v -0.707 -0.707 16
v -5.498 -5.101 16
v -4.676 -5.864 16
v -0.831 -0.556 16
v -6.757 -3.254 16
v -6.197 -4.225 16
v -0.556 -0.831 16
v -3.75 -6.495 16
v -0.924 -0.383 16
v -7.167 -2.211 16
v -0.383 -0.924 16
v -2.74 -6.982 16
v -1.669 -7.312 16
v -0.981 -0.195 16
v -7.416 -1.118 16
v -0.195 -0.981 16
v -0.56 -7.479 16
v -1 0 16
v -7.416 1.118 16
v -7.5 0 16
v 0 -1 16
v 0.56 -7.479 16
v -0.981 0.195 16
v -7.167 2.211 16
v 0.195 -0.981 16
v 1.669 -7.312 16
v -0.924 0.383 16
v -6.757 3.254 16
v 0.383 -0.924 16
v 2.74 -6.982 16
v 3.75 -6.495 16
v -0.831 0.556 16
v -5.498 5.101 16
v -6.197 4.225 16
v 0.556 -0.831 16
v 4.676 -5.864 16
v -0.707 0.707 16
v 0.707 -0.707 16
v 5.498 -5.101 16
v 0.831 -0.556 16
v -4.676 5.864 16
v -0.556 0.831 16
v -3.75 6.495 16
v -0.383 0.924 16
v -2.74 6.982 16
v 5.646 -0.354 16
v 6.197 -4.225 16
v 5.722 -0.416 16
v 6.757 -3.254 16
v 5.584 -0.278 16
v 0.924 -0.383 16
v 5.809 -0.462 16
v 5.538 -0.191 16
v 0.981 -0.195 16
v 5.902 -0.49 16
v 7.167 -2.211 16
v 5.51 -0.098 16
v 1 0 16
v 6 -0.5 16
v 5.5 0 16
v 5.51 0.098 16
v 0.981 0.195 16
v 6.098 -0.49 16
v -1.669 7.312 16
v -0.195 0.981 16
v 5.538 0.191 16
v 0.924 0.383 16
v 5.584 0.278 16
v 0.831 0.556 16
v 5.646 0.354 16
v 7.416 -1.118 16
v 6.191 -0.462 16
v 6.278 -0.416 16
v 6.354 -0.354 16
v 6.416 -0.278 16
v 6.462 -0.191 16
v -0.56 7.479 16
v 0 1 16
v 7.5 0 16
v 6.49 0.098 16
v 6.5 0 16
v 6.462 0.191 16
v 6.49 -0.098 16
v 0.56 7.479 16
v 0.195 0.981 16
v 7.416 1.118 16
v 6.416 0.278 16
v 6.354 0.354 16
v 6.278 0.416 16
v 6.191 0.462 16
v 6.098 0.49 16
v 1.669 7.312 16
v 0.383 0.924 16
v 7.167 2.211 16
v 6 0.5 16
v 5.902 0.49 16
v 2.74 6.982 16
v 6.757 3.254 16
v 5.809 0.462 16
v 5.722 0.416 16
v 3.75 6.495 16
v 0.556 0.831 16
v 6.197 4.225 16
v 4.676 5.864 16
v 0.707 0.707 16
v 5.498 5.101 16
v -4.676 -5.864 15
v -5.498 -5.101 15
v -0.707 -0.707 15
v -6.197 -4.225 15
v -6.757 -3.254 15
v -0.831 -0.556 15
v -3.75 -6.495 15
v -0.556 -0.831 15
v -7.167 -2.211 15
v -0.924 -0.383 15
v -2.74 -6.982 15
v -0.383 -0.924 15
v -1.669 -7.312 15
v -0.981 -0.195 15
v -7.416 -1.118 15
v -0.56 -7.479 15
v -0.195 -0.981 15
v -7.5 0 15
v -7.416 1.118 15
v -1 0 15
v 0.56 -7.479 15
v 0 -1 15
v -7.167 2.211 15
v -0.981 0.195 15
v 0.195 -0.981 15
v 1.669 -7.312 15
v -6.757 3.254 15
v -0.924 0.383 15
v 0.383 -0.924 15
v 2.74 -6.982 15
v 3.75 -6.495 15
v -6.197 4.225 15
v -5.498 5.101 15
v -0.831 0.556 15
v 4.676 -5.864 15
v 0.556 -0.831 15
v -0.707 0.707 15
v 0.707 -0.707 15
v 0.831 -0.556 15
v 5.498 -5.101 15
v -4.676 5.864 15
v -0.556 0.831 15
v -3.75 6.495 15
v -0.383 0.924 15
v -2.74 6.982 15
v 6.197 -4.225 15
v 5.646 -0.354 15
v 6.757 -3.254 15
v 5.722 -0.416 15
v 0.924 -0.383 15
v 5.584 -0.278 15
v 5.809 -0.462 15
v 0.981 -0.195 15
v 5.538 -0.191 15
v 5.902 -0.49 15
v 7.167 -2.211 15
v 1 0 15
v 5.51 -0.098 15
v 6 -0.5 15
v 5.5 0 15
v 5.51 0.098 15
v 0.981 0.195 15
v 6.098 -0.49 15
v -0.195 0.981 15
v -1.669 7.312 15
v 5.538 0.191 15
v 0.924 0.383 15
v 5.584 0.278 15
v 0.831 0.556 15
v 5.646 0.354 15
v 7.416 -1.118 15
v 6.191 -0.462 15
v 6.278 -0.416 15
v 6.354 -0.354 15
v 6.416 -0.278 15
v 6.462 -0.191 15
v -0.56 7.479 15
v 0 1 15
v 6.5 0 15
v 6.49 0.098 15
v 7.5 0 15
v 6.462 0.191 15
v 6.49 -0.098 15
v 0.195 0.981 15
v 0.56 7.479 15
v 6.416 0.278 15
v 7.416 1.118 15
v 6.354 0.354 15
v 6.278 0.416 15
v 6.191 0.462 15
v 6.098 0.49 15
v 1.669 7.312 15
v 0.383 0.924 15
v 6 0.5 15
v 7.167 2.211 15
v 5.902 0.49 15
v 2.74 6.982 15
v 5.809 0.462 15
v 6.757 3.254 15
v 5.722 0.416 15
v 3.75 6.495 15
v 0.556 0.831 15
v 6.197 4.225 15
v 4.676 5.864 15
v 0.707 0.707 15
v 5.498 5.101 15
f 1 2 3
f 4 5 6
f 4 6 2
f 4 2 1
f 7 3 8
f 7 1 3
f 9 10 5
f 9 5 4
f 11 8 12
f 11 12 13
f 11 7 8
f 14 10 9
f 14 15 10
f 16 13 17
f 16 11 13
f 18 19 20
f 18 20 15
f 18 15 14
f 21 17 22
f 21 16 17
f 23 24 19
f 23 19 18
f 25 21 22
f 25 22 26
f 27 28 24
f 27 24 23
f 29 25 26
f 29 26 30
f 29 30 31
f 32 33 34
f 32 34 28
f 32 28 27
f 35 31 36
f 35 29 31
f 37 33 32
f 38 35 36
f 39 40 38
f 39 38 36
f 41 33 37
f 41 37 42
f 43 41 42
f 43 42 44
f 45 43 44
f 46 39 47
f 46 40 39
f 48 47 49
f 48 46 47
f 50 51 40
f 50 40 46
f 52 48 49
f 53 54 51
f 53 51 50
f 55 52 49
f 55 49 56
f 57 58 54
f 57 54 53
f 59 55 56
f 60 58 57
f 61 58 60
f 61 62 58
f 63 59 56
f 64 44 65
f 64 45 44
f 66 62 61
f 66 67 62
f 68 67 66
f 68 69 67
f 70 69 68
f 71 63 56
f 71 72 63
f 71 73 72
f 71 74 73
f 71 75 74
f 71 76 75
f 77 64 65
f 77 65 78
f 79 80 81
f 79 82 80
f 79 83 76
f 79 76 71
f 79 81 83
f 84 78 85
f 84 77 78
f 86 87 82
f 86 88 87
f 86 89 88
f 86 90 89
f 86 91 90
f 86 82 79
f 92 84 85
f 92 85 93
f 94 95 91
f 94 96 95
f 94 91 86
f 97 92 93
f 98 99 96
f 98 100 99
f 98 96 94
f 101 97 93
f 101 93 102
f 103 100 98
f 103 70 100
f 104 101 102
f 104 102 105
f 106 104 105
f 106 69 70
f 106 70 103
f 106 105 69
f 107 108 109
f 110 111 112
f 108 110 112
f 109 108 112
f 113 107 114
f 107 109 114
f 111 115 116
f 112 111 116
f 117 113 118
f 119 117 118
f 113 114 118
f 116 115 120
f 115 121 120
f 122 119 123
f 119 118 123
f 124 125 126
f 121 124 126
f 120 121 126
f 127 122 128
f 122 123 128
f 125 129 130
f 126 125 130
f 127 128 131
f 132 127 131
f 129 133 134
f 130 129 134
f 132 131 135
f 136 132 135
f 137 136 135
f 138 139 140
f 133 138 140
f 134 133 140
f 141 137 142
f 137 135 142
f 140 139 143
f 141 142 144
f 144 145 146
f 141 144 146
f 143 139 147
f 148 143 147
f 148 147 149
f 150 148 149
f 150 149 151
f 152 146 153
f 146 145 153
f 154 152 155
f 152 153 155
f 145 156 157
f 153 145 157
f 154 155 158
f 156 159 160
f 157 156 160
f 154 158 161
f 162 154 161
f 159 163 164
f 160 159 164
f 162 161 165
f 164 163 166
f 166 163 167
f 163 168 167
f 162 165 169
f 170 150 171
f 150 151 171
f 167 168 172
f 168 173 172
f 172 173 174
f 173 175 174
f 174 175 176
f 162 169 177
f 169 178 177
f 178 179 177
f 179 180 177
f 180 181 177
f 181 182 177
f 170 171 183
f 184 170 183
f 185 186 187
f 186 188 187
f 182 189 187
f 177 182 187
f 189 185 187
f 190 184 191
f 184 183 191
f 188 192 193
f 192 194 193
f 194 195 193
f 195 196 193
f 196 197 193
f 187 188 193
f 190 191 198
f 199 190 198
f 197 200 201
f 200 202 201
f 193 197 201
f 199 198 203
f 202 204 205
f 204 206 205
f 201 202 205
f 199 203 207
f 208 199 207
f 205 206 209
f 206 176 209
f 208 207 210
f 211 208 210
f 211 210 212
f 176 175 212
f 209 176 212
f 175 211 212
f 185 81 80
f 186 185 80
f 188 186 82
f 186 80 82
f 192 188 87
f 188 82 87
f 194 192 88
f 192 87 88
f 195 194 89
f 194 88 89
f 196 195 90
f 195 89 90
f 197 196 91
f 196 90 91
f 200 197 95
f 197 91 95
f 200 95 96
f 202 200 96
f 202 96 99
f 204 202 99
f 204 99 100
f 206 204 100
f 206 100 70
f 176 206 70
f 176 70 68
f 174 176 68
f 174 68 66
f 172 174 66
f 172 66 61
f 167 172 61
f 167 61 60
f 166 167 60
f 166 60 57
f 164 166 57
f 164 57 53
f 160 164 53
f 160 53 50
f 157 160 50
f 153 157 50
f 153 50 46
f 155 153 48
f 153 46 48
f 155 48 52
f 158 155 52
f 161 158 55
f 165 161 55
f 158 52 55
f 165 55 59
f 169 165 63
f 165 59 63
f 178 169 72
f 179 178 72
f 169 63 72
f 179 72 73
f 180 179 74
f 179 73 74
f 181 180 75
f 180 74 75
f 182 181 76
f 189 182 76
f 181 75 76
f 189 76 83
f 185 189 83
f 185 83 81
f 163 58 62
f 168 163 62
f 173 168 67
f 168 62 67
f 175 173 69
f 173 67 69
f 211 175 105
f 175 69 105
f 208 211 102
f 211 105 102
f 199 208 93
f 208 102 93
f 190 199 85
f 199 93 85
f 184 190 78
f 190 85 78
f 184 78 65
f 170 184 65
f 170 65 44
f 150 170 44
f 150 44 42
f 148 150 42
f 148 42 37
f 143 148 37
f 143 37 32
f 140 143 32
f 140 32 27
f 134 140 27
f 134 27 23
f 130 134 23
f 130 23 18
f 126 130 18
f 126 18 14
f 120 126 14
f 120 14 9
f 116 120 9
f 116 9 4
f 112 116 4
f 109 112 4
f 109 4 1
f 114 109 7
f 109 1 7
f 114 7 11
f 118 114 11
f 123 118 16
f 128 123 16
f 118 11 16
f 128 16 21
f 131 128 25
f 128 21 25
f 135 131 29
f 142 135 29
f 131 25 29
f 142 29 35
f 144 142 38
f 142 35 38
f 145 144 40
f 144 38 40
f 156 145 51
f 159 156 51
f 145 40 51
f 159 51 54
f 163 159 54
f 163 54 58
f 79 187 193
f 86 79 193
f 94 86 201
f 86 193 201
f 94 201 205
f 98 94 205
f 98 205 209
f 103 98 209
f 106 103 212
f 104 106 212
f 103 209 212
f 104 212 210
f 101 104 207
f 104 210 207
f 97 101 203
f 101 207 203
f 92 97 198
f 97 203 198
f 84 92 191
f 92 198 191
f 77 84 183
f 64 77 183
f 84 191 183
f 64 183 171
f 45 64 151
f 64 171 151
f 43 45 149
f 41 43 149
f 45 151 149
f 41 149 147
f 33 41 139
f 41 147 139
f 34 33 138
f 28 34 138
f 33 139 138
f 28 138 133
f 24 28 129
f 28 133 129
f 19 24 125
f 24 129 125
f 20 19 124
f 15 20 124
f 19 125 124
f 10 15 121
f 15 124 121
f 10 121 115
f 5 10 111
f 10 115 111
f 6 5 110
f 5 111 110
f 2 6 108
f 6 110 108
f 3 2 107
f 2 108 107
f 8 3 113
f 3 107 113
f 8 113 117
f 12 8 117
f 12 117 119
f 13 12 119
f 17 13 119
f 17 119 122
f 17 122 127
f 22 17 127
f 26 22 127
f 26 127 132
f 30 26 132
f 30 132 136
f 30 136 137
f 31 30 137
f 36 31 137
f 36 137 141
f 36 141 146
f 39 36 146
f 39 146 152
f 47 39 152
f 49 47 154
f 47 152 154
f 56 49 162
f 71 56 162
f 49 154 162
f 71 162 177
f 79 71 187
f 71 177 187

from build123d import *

# Parameters (mm, degrees)
SKETCH1_R           = 1
BOSS_EXTRUDE1_DEPTH = 15
SKETCH2_R           = 7.5
BOSS_EXTRUDE2_DEPTH = 1
SKETCH3_R           = 0.5
CUT_EXTRUDE1_DEPTH  = 10
SKETCH5_R           = 1
CUT_EXTRUDE2_DEPTH  = 20


with BuildPart() as part:
    # Sketch1 → Boss-Extrude1 (new body)
    with BuildSketch(Plane.XY):
        Circle(SKETCH1_R)
    extrude(amount=BOSS_EXTRUDE1_DEPTH)

    # Sketch2 → Boss-Extrude2 (add)
    with BuildSketch(Plane.XY.offset(15)):
        Circle(SKETCH2_R)
    extrude(amount=BOSS_EXTRUDE2_DEPTH)

    # Sketch3 → Cut-Extrude1 (cut)
    with BuildSketch(Plane.XY.offset(16)):
        with Locations((6, 0)):
            Circle(SKETCH3_R)
    extrude(amount=-CUT_EXTRUDE1_DEPTH, mode=Mode.SUBTRACT)

    # Sketch5 → Cut-Extrude2 (cut)
    with BuildSketch(Plane.XY.offset(16)):
        Circle(SKETCH5_R)
    extrude(amount=-CUT_EXTRUDE2_DEPTH, mode=Mode.SUBTRACT)


solid = part.part
